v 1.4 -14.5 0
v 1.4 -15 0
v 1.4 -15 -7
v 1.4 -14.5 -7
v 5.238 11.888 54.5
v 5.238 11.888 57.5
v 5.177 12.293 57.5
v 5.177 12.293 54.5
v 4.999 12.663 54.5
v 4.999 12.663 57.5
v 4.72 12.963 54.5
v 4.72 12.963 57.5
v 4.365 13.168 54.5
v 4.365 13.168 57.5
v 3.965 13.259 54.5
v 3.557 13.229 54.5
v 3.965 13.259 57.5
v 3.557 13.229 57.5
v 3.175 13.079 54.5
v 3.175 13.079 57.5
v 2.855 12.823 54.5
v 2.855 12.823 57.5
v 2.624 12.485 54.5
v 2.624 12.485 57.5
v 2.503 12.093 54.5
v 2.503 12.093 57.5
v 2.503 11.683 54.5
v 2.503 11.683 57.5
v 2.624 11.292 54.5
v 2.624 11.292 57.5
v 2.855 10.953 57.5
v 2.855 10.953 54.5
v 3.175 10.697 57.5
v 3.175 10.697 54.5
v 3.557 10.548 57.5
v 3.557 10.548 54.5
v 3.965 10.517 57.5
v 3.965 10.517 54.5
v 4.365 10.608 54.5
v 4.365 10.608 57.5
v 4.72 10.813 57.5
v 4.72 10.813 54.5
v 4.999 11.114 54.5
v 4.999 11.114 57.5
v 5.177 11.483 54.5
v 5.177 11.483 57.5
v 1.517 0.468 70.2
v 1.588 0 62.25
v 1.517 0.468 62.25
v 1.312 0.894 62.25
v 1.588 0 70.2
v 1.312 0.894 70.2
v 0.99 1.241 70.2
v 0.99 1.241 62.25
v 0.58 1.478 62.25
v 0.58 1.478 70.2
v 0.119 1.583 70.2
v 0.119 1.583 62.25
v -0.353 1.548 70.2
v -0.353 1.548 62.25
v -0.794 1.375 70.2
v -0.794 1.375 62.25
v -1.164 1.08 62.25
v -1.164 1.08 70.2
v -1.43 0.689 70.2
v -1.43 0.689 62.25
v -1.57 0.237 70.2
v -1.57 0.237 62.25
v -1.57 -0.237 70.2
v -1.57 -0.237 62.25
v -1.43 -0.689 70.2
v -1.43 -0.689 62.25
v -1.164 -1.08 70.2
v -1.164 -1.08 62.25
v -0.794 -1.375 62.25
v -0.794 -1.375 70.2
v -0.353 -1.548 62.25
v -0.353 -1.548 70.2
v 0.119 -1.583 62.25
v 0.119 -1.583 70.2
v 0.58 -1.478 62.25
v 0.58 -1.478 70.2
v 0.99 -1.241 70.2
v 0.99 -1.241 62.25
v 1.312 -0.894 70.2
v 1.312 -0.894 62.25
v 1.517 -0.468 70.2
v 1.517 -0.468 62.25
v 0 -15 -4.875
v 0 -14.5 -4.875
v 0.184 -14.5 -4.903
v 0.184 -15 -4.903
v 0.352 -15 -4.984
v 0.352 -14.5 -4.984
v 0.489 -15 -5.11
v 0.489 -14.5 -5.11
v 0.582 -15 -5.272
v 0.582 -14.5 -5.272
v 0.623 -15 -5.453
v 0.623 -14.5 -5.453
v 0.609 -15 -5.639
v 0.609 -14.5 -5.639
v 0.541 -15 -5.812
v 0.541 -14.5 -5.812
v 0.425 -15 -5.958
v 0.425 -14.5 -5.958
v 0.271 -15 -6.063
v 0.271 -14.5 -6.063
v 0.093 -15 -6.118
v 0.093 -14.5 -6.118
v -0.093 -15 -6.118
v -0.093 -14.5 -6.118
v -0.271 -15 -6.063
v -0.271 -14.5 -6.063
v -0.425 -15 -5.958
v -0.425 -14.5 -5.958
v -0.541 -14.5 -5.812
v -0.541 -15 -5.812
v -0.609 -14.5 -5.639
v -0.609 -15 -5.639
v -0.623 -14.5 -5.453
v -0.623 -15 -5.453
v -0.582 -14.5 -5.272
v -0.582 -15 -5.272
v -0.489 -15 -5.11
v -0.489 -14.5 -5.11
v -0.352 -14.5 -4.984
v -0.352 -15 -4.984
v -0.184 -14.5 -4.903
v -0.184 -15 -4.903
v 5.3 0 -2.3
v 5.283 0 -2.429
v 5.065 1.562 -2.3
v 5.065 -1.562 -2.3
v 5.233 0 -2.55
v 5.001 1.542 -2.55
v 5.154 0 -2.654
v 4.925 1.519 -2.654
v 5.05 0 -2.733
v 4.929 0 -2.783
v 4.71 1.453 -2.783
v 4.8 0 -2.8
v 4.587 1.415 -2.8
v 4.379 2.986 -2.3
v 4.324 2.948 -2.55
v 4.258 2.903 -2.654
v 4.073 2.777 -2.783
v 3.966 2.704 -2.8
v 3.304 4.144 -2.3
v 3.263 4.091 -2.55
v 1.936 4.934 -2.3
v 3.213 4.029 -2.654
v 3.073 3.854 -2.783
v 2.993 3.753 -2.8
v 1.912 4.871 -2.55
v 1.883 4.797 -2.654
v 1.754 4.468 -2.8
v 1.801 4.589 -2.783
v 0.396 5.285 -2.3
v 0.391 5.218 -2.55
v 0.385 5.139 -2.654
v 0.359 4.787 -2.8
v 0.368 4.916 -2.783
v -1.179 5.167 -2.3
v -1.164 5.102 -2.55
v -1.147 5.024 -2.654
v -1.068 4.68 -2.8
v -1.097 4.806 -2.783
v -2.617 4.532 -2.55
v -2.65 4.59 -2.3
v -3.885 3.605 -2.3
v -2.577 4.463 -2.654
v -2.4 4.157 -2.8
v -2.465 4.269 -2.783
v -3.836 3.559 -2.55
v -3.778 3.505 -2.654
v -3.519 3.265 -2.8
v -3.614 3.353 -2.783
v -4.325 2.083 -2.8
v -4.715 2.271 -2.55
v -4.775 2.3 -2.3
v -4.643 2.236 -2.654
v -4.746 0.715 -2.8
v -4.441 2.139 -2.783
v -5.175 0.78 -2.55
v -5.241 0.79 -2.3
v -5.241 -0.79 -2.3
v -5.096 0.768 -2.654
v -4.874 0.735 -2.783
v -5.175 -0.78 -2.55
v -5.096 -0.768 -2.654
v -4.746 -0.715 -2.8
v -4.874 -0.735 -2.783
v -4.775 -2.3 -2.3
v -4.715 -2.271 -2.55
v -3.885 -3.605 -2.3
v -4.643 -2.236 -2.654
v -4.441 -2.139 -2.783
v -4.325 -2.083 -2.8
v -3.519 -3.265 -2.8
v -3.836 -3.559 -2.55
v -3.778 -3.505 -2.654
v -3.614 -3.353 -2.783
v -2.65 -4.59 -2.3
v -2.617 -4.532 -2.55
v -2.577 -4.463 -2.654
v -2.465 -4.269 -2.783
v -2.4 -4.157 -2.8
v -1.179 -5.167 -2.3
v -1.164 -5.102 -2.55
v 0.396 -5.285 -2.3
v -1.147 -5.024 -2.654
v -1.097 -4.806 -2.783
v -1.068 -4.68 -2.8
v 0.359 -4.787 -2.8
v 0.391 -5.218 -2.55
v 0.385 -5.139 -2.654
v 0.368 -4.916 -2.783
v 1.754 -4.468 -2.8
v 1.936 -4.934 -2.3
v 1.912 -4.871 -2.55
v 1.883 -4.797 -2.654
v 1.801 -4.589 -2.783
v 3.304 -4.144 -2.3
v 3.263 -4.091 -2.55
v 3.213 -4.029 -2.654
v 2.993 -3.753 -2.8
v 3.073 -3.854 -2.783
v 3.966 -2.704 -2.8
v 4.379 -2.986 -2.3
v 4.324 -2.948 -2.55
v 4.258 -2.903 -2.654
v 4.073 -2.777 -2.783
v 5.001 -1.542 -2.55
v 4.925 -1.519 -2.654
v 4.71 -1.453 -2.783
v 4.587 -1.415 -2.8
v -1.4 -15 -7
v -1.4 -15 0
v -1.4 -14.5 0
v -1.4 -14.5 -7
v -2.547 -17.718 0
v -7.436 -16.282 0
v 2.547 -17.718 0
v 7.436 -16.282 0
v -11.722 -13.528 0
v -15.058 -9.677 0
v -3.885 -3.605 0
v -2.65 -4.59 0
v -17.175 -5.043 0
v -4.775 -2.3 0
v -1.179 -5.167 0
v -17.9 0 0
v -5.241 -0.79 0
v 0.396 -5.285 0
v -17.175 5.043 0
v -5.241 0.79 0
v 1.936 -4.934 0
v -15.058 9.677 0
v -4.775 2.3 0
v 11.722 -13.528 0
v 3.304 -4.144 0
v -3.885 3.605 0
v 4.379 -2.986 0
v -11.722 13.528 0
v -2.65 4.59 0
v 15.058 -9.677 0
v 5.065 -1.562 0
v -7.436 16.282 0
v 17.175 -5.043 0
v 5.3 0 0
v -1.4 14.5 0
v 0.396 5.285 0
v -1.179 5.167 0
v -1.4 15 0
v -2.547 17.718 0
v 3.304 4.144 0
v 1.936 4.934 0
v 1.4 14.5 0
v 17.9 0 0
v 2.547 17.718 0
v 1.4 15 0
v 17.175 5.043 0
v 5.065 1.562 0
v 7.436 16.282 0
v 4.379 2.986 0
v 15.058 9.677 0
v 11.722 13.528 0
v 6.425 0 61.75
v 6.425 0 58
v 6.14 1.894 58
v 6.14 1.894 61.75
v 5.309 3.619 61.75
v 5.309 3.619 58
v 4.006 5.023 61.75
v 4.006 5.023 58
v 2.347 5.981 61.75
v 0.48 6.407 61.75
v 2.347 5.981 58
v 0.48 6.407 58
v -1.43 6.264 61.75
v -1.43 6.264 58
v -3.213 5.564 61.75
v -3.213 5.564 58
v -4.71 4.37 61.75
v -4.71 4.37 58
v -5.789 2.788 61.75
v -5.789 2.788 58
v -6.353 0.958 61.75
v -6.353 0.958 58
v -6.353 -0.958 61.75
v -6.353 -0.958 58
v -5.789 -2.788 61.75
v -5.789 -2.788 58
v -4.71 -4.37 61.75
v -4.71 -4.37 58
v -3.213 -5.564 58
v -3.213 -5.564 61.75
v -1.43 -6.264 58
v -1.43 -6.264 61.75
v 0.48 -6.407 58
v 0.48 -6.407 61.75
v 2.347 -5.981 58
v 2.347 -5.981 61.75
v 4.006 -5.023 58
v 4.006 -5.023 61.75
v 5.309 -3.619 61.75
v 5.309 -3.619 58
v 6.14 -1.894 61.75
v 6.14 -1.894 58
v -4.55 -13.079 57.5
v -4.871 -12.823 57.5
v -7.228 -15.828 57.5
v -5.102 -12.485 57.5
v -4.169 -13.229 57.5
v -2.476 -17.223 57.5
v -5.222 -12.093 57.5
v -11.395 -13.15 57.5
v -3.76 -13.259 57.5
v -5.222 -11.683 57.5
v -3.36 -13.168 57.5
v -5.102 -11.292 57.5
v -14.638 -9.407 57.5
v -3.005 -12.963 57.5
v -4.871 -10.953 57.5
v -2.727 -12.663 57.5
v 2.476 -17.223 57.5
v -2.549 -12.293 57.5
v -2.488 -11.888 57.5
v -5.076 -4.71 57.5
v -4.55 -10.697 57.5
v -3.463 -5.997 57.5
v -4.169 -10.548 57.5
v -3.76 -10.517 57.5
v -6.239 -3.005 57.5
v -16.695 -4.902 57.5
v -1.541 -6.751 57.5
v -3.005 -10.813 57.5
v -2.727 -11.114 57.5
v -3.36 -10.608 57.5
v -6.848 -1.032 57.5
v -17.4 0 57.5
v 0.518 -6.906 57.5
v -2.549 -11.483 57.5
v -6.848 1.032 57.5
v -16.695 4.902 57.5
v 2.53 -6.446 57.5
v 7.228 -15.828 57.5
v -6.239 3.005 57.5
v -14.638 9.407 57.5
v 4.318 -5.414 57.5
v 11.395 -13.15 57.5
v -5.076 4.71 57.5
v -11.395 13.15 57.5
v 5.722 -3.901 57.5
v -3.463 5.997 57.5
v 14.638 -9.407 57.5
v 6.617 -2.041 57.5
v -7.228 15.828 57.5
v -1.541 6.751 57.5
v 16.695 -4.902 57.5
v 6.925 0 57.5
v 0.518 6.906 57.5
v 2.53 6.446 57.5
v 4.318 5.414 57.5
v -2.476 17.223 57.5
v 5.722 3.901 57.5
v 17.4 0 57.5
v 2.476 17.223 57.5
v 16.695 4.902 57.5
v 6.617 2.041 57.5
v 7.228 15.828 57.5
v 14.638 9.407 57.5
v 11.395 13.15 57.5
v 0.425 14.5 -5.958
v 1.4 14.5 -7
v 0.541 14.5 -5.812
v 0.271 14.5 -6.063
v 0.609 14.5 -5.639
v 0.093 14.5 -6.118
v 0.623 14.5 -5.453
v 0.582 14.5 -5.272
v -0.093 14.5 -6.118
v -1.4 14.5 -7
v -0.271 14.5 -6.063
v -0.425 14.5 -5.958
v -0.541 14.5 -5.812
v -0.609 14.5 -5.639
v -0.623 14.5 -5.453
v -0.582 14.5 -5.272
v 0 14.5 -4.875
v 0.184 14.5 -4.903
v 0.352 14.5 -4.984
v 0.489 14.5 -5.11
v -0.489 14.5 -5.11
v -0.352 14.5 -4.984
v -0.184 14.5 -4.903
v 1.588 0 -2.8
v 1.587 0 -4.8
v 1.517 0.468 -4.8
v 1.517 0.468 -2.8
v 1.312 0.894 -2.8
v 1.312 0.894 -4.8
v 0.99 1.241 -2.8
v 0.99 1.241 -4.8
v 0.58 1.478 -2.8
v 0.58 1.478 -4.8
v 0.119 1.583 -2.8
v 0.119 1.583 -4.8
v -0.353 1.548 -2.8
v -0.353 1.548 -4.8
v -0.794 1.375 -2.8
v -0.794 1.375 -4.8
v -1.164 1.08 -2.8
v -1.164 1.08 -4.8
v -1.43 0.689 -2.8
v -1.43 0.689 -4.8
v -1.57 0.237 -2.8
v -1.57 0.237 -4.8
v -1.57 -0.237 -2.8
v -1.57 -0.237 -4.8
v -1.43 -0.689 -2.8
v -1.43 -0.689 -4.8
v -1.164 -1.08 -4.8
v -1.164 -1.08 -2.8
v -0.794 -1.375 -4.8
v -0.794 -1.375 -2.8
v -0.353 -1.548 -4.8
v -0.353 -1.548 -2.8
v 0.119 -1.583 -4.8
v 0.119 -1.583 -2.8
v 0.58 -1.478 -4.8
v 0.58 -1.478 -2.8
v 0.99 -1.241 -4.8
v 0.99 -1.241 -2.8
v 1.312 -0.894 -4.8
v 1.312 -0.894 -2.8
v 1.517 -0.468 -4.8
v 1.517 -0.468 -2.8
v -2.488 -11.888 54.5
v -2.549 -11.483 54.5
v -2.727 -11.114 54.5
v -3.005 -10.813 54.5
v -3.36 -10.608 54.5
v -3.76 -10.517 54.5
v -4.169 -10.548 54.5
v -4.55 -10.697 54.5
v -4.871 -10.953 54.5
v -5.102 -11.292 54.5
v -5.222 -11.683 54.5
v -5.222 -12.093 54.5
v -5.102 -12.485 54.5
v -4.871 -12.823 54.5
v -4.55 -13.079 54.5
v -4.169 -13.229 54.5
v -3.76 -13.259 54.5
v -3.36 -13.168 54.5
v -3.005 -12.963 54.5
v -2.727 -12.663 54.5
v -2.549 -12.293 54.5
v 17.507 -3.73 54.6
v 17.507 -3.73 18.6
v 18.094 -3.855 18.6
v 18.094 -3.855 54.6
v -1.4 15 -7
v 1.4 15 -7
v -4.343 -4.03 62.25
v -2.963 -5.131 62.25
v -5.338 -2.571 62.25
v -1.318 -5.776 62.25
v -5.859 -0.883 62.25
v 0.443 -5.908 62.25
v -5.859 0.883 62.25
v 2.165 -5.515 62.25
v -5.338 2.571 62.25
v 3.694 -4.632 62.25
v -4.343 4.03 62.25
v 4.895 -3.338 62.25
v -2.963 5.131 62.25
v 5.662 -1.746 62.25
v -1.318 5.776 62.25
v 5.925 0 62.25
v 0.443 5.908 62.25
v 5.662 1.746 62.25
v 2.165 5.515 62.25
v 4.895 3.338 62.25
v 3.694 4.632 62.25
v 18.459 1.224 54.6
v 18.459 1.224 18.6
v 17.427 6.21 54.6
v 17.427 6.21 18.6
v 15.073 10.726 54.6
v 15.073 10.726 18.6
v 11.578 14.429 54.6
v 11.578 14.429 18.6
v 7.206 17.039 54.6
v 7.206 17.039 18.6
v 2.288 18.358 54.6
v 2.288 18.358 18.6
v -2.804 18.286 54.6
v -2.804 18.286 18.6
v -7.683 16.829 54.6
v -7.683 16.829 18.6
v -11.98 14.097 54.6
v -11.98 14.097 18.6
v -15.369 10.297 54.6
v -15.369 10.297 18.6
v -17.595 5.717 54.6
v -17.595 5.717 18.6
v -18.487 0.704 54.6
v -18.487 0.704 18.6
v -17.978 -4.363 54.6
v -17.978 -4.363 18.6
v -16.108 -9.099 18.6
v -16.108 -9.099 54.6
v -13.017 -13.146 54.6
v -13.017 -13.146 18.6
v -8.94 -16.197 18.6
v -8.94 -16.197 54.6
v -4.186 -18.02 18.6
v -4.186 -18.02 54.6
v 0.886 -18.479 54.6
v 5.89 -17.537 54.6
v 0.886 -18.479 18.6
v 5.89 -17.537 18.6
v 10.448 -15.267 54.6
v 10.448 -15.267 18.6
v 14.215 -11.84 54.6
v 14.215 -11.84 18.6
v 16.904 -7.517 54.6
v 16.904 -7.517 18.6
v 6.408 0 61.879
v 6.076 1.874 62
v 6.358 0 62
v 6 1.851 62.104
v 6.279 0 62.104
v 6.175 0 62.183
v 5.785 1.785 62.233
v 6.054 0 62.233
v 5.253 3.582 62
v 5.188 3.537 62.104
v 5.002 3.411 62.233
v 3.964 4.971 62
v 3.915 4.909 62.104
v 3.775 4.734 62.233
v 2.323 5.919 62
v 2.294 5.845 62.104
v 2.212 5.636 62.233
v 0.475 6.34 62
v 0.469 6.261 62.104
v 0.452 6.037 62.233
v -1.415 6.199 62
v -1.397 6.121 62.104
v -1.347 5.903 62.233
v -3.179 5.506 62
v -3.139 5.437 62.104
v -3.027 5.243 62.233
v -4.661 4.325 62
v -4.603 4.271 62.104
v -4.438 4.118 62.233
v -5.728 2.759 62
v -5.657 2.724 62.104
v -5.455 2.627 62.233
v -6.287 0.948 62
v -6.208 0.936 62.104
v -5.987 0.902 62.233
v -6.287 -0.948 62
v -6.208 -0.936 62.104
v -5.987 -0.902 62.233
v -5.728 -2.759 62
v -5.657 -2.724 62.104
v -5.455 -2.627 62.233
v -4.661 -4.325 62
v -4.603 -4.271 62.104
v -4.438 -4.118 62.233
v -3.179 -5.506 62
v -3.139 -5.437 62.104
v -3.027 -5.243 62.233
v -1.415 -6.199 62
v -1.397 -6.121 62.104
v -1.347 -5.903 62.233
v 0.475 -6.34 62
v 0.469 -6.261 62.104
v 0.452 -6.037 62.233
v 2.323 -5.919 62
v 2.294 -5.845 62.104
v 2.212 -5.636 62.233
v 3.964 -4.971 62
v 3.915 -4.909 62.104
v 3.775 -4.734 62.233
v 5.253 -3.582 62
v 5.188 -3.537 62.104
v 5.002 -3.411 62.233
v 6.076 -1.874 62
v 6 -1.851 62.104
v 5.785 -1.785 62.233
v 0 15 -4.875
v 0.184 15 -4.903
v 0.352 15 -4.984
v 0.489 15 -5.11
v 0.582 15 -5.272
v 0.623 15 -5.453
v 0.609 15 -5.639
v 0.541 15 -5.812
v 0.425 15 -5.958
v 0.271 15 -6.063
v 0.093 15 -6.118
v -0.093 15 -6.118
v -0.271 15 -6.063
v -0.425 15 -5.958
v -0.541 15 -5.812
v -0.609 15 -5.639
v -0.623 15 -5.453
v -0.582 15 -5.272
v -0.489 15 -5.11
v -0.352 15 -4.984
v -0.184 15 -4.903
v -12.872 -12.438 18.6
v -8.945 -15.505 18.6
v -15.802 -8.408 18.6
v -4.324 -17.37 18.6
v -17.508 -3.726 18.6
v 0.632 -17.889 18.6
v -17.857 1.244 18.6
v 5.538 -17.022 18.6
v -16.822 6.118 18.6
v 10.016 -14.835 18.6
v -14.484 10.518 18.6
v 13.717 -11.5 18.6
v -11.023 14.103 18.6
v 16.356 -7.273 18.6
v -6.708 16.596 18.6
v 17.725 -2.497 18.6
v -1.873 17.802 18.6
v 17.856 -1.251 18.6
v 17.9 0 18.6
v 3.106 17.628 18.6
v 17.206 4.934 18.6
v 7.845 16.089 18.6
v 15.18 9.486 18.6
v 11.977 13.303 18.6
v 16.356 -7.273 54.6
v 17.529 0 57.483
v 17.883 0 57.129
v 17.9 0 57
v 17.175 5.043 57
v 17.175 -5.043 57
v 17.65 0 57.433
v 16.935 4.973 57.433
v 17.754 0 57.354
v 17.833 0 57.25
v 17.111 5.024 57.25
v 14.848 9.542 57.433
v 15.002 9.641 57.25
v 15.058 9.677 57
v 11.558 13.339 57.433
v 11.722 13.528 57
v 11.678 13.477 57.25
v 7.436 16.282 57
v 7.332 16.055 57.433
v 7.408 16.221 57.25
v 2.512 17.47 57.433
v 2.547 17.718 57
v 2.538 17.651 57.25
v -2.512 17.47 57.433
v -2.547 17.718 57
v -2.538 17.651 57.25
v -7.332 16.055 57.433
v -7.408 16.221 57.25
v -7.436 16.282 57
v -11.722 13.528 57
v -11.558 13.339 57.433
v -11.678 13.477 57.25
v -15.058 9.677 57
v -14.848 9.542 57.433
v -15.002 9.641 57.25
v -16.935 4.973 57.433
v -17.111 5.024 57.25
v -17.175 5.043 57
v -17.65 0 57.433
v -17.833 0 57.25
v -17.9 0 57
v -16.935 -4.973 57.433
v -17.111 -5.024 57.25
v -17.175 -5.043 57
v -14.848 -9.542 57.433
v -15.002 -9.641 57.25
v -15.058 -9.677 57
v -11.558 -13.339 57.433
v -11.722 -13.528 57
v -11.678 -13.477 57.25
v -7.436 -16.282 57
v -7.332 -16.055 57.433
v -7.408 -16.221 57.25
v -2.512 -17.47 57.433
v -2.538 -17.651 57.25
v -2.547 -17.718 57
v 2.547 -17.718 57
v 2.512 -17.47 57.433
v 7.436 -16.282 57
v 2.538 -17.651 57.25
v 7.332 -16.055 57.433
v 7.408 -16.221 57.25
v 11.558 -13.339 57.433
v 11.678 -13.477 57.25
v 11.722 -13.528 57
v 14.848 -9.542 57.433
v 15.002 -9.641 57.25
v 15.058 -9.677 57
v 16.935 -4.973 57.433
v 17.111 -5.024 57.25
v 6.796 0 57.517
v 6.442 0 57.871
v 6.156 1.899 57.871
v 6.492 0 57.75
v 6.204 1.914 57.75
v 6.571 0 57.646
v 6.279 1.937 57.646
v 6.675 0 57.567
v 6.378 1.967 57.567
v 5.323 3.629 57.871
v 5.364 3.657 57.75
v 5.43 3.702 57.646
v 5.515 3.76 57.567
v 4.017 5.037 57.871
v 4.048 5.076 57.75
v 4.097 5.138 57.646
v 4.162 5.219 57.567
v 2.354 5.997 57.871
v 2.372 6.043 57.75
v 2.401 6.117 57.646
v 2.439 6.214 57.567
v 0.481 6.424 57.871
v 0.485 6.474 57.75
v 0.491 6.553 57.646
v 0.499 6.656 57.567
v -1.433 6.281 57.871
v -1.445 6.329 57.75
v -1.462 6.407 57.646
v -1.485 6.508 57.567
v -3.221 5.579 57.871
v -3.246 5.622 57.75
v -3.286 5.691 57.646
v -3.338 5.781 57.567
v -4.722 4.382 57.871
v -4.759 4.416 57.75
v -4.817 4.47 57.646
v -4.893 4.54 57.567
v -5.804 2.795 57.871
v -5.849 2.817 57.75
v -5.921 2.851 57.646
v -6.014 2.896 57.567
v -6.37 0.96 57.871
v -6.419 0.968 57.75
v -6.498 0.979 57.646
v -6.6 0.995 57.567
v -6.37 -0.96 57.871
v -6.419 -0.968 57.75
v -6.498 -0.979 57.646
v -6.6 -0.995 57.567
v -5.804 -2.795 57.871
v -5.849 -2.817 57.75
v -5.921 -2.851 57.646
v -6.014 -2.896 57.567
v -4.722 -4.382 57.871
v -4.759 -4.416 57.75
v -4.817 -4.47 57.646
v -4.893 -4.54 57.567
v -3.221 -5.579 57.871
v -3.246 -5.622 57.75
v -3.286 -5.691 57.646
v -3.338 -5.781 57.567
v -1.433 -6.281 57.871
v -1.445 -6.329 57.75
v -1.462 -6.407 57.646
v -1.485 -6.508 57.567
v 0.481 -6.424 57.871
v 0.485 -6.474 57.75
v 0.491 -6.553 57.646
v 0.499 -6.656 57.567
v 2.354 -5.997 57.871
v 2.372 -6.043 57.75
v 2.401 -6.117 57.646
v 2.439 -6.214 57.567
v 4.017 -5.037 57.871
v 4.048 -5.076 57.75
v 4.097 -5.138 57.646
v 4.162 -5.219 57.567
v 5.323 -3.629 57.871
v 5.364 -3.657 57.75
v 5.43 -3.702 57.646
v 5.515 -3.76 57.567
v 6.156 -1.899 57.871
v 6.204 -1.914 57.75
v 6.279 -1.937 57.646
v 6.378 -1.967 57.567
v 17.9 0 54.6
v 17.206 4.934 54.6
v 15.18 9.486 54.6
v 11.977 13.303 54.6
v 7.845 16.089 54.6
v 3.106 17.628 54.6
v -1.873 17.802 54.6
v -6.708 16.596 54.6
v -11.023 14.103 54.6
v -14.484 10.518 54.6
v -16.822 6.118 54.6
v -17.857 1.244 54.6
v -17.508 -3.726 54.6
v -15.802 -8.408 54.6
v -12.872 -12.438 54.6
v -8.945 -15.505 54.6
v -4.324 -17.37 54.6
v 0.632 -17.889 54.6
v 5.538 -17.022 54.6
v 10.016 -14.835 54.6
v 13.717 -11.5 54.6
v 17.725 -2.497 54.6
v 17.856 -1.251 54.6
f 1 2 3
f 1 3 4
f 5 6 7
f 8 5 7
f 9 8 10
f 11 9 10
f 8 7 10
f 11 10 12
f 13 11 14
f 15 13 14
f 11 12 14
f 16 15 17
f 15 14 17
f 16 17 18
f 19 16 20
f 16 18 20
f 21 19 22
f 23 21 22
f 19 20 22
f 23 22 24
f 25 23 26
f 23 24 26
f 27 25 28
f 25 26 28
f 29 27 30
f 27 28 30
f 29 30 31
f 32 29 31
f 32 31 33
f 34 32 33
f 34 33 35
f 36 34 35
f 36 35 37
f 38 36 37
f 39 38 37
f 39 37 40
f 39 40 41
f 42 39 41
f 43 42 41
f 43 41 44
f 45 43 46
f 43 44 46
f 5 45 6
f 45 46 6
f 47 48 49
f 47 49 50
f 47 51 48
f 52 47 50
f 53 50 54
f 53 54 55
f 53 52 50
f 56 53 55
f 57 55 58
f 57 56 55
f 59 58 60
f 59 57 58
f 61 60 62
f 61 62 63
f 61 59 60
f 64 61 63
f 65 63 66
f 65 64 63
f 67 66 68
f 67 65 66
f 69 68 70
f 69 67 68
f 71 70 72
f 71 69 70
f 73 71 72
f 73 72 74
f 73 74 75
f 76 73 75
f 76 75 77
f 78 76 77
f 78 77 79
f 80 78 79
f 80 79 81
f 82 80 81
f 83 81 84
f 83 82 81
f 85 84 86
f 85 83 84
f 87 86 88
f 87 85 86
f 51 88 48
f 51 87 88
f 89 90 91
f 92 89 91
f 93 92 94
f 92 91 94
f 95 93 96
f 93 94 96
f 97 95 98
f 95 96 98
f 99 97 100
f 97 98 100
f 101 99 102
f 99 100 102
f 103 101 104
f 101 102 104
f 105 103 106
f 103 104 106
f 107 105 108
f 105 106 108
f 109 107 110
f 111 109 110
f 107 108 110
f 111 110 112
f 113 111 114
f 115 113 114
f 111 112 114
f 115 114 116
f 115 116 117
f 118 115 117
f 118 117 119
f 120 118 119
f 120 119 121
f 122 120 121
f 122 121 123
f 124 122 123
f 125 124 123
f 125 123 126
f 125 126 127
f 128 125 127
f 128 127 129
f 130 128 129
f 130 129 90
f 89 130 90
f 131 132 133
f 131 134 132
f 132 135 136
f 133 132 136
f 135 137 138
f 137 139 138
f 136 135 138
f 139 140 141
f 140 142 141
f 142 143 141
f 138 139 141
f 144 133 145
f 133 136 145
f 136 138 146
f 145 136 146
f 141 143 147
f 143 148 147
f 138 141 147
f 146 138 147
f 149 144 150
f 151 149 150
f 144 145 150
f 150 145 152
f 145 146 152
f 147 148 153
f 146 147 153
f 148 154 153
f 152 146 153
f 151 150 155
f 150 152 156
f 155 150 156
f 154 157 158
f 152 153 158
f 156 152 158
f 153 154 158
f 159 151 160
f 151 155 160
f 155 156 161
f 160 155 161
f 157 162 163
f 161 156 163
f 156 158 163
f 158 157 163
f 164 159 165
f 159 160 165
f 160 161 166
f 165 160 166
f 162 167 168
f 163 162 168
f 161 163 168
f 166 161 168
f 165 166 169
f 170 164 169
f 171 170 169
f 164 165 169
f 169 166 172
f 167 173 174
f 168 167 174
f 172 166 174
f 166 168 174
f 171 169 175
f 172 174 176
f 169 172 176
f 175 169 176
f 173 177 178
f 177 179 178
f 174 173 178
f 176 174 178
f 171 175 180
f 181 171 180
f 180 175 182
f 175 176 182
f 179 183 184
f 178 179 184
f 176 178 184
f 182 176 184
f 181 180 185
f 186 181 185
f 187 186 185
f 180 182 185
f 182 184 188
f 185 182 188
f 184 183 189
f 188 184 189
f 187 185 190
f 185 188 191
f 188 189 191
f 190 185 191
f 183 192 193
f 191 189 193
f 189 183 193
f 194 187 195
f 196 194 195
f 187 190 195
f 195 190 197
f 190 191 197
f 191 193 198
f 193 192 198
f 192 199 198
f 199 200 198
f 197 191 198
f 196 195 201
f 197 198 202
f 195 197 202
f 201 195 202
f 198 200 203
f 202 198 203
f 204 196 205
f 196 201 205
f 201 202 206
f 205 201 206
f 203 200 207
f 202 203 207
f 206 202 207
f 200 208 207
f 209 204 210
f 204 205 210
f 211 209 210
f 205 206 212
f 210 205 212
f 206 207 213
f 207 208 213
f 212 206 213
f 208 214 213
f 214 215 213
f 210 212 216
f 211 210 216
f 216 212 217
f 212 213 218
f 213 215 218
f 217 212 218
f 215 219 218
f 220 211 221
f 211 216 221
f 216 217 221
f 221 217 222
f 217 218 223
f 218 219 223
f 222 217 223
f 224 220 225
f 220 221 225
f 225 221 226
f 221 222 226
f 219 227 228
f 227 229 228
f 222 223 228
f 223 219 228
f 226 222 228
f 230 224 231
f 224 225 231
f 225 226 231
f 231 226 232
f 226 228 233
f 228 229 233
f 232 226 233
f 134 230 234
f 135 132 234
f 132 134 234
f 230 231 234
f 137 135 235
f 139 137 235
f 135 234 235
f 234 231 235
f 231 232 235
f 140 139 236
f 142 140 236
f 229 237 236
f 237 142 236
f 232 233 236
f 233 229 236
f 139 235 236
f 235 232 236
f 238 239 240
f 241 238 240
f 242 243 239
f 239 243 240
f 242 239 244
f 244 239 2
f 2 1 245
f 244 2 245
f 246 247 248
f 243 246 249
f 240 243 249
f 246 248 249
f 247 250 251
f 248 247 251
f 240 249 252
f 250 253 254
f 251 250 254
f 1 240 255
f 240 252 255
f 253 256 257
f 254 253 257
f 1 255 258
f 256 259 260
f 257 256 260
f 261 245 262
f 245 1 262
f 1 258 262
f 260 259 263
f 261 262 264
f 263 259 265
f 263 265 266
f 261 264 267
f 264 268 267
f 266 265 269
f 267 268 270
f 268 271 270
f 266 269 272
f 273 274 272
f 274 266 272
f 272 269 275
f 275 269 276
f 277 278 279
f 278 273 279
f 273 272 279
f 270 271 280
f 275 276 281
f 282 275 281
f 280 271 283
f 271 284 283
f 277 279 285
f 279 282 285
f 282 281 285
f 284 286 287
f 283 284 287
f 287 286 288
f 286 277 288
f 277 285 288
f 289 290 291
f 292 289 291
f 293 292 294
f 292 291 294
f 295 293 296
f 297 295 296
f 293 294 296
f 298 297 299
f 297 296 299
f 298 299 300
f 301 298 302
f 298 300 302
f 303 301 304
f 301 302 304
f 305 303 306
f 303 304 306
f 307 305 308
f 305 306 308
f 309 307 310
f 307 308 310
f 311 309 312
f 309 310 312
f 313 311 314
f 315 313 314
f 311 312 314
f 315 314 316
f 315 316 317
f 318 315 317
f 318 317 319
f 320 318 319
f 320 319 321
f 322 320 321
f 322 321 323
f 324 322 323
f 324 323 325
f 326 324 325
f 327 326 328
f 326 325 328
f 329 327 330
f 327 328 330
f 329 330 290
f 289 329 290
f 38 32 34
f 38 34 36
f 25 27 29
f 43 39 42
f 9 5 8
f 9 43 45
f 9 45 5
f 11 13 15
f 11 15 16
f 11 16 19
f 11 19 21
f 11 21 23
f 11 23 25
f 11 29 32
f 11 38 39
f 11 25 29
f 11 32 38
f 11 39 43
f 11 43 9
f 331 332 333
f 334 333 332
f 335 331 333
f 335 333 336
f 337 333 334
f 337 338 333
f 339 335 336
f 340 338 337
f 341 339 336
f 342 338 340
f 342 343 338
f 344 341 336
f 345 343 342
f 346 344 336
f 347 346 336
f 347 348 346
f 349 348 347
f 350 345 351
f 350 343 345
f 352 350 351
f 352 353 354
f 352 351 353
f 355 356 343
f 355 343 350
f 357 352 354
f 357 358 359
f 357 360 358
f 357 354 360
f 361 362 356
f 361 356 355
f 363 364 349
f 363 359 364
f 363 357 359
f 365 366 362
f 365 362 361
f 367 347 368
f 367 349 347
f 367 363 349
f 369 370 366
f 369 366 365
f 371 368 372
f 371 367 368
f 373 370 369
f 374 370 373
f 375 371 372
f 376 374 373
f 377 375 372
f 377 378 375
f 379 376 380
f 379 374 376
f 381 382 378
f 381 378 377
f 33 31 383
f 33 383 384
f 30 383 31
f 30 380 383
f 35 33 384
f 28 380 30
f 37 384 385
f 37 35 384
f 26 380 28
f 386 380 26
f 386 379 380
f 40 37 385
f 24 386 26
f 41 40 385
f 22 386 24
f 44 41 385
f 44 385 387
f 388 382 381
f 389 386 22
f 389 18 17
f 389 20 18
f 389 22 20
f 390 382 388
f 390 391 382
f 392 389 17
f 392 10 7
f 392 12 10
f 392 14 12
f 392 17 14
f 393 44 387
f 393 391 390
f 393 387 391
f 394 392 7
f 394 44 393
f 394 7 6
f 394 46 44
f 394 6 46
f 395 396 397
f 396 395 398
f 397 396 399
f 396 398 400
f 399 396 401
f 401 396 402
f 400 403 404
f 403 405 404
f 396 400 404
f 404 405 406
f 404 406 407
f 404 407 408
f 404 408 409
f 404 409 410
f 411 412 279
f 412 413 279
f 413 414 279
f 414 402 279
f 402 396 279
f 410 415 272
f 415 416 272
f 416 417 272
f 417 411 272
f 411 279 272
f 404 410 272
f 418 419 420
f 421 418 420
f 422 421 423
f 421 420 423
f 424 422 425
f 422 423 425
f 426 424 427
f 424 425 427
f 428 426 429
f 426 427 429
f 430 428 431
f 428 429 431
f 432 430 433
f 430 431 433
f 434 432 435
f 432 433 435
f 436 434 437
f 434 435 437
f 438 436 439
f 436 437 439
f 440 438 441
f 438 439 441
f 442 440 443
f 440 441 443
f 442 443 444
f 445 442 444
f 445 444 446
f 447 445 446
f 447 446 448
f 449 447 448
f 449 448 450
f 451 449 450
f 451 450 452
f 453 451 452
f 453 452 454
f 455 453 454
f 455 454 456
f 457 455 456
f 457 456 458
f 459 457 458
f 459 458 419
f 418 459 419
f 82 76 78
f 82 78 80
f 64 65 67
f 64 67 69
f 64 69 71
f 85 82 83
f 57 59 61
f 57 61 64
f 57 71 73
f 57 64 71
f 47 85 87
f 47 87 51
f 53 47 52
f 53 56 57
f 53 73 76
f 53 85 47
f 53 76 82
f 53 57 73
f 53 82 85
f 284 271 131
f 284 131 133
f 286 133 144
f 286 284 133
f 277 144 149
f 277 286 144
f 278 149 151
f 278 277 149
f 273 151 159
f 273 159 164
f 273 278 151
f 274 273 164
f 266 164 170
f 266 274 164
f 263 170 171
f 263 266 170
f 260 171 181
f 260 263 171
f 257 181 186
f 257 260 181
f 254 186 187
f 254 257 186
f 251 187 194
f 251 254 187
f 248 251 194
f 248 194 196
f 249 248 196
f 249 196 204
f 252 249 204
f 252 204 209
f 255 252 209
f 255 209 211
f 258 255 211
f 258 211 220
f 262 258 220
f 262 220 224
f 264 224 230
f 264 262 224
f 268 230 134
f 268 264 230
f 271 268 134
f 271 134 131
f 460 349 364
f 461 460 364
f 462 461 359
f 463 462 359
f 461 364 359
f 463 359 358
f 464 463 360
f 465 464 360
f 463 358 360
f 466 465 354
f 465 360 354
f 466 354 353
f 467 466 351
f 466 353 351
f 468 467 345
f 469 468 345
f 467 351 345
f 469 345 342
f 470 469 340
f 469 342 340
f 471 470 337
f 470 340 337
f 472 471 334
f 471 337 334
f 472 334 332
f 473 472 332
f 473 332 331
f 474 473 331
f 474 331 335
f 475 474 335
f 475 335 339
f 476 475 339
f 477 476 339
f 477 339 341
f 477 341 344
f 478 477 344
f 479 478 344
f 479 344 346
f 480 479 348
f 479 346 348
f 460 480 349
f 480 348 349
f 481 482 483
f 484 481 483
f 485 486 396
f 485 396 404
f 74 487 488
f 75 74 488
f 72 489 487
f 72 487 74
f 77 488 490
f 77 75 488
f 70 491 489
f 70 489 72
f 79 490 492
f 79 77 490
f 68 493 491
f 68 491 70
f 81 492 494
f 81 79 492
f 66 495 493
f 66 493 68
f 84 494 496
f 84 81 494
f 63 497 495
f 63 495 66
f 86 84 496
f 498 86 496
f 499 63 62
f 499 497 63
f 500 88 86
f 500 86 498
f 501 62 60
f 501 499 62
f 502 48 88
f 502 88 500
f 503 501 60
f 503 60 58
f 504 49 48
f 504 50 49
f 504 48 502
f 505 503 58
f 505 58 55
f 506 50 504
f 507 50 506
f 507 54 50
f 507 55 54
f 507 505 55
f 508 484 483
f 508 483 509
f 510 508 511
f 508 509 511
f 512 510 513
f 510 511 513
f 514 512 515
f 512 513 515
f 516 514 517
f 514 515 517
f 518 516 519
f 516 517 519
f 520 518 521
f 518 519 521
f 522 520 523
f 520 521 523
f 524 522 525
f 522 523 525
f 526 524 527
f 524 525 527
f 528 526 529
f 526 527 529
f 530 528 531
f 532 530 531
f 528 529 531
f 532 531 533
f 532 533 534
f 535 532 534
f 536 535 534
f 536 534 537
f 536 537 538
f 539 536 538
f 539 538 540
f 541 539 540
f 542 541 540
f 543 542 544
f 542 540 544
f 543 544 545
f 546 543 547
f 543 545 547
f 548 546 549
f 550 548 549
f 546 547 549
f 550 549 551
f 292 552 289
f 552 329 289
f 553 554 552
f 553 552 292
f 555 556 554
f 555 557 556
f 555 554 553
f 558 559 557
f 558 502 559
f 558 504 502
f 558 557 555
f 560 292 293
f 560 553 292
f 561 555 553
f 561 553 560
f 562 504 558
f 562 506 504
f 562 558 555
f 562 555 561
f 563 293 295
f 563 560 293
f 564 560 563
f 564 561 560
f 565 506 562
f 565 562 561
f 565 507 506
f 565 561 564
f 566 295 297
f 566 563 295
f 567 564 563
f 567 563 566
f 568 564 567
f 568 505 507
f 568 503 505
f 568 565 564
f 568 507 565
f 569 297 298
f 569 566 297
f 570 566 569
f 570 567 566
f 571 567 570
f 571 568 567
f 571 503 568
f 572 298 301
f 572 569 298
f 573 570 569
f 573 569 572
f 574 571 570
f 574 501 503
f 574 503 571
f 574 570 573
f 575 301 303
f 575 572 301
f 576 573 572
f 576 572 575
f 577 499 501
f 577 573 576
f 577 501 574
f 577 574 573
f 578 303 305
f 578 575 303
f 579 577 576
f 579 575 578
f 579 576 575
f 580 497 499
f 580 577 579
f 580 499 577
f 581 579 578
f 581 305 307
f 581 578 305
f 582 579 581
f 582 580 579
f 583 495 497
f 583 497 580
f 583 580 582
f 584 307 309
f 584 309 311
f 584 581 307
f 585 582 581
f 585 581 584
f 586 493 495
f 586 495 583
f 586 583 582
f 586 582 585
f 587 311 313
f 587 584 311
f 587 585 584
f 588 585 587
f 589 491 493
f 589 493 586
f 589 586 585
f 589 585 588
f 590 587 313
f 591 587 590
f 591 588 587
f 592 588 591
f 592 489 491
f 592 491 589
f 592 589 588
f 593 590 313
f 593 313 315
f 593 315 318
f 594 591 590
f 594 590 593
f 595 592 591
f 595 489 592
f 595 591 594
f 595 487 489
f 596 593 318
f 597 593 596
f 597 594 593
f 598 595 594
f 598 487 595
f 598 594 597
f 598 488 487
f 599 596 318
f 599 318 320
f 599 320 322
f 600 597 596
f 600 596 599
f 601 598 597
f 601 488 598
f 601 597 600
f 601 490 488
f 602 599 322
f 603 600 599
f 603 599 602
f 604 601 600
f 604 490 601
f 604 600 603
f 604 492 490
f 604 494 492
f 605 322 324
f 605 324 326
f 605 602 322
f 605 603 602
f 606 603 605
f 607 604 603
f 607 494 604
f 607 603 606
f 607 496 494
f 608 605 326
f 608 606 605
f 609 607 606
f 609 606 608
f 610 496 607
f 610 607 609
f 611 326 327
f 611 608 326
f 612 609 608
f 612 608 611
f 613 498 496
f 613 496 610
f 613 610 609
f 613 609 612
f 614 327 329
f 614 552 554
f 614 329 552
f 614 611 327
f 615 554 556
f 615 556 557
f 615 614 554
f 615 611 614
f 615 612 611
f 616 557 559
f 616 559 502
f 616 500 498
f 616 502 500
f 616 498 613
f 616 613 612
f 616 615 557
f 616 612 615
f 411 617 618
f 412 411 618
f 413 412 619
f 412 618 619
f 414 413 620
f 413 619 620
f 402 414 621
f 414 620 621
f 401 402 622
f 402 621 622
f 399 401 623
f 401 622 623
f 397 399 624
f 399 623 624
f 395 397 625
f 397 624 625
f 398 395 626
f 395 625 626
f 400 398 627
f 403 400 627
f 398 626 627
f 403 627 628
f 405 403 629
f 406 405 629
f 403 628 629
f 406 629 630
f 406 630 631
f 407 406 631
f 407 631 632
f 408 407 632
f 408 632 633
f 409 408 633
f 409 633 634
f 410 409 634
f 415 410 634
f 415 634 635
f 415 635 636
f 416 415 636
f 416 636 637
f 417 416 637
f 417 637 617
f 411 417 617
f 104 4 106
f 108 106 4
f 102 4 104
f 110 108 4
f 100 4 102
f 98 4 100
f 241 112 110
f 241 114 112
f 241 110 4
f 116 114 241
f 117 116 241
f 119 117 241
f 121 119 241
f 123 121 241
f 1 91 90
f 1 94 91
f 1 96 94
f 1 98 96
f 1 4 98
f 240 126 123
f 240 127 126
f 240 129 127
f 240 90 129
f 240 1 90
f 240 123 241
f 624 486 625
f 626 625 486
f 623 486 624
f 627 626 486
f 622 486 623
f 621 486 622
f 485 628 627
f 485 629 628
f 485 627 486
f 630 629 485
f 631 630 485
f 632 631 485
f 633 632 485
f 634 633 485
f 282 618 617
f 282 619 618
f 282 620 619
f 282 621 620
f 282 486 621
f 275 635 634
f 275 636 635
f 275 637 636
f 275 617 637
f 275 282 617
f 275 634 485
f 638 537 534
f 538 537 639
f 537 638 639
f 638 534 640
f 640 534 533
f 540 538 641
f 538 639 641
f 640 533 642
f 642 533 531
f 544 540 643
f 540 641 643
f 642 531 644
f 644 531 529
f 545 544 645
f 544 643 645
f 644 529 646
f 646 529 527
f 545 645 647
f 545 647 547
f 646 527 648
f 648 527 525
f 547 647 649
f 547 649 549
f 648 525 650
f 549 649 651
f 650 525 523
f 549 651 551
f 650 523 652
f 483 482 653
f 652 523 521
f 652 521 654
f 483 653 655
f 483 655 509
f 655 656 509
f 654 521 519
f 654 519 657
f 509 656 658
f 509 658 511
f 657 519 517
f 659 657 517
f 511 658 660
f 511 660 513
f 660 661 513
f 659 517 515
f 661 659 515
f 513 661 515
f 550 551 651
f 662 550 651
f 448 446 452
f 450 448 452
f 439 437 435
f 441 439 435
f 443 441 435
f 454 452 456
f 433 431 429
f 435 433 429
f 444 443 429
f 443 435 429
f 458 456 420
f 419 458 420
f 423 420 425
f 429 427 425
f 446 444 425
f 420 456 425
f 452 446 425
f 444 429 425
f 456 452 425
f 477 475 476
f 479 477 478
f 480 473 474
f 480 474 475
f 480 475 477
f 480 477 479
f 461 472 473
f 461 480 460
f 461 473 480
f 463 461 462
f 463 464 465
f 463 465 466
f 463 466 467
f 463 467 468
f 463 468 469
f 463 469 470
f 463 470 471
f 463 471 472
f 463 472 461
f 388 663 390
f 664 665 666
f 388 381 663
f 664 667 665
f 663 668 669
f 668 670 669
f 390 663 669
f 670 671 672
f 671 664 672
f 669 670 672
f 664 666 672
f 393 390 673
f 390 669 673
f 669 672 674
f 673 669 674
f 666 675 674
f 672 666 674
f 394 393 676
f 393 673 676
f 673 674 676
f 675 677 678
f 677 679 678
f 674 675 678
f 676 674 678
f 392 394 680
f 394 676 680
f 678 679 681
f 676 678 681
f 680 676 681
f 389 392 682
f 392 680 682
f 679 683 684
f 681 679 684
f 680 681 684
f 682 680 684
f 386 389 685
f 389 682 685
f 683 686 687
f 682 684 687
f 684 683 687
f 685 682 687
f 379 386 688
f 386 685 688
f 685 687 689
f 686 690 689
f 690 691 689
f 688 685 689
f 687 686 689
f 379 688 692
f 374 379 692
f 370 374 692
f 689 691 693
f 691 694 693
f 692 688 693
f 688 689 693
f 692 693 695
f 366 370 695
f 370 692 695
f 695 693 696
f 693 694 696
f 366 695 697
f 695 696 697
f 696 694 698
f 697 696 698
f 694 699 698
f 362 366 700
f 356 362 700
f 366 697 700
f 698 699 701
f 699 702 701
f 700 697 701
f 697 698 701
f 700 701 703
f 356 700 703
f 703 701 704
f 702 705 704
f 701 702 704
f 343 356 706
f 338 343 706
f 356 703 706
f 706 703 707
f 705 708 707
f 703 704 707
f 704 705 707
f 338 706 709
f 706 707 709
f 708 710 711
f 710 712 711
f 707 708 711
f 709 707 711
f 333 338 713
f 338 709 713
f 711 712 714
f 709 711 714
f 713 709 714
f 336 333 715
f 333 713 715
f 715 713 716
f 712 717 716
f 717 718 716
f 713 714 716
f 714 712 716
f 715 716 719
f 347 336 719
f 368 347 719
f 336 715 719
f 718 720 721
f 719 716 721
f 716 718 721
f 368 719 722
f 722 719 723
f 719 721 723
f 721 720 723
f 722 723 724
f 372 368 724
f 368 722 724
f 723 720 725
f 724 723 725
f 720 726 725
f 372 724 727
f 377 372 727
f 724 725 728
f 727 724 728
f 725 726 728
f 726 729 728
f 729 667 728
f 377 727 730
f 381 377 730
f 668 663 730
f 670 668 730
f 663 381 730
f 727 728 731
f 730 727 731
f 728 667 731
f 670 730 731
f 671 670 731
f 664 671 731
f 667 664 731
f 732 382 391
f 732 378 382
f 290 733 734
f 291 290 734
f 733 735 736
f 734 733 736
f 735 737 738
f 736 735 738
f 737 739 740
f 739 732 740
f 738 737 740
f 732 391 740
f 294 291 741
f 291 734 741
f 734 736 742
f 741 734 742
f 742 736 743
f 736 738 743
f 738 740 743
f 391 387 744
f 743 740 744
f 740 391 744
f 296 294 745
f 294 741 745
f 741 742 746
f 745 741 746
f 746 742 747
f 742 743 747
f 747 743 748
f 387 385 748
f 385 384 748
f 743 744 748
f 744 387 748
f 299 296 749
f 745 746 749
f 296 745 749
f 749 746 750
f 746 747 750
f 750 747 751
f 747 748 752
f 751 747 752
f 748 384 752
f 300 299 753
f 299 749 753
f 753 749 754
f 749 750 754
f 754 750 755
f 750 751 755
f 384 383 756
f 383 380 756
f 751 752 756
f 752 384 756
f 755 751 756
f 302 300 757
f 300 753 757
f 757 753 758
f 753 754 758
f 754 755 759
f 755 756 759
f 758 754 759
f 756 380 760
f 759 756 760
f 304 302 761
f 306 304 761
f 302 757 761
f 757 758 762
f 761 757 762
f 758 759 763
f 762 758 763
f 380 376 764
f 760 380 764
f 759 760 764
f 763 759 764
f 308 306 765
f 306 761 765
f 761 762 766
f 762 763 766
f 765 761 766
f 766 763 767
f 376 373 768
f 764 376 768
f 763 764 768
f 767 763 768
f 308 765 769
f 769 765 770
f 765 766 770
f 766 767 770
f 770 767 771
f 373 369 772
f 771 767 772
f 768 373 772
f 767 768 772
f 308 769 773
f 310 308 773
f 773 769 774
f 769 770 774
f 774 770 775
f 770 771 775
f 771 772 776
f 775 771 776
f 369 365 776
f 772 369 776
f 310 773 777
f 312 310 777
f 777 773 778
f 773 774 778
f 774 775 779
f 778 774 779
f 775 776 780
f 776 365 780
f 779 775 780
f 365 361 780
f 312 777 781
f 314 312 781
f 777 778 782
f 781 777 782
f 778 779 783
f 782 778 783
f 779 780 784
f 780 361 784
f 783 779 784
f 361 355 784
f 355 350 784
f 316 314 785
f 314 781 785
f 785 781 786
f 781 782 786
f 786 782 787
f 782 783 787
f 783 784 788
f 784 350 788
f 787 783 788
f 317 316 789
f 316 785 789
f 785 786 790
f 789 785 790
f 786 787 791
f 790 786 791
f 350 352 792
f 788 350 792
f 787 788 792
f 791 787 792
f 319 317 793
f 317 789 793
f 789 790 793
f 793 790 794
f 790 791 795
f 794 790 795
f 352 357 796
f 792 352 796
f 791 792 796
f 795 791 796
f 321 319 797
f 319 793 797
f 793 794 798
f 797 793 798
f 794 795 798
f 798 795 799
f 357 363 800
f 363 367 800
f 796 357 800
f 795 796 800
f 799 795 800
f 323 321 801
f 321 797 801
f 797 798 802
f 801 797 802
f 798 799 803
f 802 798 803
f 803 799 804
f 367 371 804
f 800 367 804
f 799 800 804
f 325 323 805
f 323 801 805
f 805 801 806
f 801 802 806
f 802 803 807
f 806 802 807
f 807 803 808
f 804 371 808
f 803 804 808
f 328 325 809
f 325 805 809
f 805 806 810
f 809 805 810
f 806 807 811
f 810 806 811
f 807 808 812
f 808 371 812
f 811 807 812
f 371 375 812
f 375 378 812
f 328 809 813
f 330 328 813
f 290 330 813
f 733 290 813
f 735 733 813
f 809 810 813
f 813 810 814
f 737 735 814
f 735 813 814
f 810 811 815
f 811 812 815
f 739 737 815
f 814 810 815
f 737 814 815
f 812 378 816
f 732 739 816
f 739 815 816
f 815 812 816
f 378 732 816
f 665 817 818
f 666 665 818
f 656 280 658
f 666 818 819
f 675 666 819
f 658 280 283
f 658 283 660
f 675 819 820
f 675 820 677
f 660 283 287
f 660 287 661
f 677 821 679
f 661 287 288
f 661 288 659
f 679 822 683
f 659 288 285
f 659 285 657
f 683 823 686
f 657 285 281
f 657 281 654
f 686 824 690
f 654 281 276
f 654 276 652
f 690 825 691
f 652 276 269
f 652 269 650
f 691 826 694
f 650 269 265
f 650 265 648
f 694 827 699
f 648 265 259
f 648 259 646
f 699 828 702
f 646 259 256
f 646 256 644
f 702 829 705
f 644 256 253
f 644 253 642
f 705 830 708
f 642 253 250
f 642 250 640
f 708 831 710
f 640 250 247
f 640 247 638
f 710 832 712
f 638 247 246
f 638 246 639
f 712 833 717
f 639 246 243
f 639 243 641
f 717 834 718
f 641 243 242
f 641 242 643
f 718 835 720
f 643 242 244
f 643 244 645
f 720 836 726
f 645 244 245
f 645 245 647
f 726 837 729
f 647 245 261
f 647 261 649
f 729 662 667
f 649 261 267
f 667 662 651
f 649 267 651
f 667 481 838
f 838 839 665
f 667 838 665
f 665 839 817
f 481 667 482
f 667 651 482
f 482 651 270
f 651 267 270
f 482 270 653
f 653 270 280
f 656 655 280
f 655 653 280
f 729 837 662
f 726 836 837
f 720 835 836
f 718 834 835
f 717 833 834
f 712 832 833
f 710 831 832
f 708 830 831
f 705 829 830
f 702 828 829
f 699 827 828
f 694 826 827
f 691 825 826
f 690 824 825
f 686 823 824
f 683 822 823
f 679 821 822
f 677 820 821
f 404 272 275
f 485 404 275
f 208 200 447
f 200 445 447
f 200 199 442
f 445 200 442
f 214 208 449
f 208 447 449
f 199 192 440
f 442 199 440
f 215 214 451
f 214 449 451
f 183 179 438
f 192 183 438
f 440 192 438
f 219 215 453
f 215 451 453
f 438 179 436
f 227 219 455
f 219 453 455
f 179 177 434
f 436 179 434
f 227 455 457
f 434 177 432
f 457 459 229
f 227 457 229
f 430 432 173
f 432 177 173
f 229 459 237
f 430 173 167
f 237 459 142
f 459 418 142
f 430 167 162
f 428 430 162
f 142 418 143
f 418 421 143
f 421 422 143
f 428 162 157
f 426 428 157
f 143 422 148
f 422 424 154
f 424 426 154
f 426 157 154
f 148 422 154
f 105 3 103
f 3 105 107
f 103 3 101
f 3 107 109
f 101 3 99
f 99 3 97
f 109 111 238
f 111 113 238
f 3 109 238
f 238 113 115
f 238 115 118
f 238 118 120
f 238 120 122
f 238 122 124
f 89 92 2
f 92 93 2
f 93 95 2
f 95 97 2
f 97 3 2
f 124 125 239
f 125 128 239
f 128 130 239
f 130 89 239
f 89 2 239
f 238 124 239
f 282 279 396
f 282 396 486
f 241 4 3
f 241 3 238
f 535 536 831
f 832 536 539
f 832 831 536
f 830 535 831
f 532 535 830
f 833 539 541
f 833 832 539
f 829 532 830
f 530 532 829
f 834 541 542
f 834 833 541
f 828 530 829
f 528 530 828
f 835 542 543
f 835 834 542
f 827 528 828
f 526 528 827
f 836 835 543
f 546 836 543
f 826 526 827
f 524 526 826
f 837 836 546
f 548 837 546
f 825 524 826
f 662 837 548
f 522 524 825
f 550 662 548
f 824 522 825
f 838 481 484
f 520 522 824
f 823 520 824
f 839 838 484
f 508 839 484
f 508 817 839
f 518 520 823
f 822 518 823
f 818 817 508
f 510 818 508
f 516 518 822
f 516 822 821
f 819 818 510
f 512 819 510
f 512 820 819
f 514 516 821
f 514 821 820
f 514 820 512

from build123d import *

# Parameters (mm, degrees)
SKETCH1_R                = 17.9
BOSS_EXTRUDE1_DEPTH      = 57.5
SKETCH1_3_R              = 5.3
SKETCH1_3_R_2            = 1.5875
BOSS_EXTRUDE2_DEPTH      = 2.8
BOSS_EXTRUDE4_DEPTH      = 57.5
BOSS_EXTRUDE4_DEPTH_BACK = 2
BOSS_EXTRUDE4_START      = -2.8
SKETCH1_5_R              = 1.5875
BOSS_EXTRUDE5_START      = 70.2
SKETCH1_6_R              = 1.5875
BOSS_EXTRUDE5_DEPTH      = 75
SKETCH2_R                = 1.375
CUT_EXTRUDE1_DEPTH       = 3
SKETCH3_W                = 2.8
SKETCH3_H                = 0.5
BOSS_EXTRUDE6_DEPTH      = 7
SKETCH4_R                = 0.625
CUT_EXTRUDE2_DEPTH       = 80.566701578
SKETCH2_3_R              = 6.425
BOSS_EXTRUDE7_DEPTH      = 4.75
BOSS_EXTRUDE8_START      = -38.9
BOSS_EXTRUDE8_DEPTH      = 36
FILLET1_R                = 0.5


with BuildPart() as part:
    # Sketch1 → Boss-Extrude1 (new body)
    with BuildSketch(Plane.XY):
        Circle(SKETCH1_R)
    extrude(amount=BOSS_EXTRUDE1_DEPTH)

    # Sketch1<3> → Boss-Extrude2 (add)
    with BuildSketch(Plane.XY):
        Circle(SKETCH1_3_R)
        Circle(SKETCH1_3_R_2, mode=Mode.SUBTRACT)
    extrude(amount=-BOSS_EXTRUDE2_DEPTH)

    # Sketch1<5> → Boss-Extrude4 (add, two sides: drawn at the far end of the back side and taken through both)
    with BuildSketch(Plane.XY.offset(BOSS_EXTRUDE4_START - BOSS_EXTRUDE4_DEPTH_BACK)):
        Circle(SKETCH1_5_R)
    extrude(amount=BOSS_EXTRUDE4_DEPTH + BOSS_EXTRUDE4_DEPTH_BACK)

    # Sketch1<6> → Boss-Extrude5 (add)
    with BuildSketch(Plane.XY.offset(BOSS_EXTRUDE5_START)):
        Circle(SKETCH1_6_R)
    extrude(amount=-BOSS_EXTRUDE5_DEPTH)

    # Sketch2 → Cut-Extrude1 (cut)
    with BuildSketch(Plane.XY.offset(57.5)):
        with Locations((3.86271243, 11.888206454)):
            Circle(SKETCH2_R)
        with Locations((-3.86271243, -11.888206454)):
            Circle(SKETCH2_R)
    extrude(amount=-CUT_EXTRUDE1_DEPTH, mode=Mode.SUBTRACT)

    # Sketch3 → Boss-Extrude6 (add)
    with BuildSketch(Plane(origin=(0, 0, 0), x_dir=(-1, 0, 0), z_dir=(0, 0, -1))):
        with Locations((0, -14.75)):
            Rectangle(SKETCH3_W, SKETCH3_H)
        with Locations((0, 14.75)):
            Rectangle(SKETCH3_W, SKETCH3_H)
    extrude(amount=BOSS_EXTRUDE6_DEPTH)

    # Sketch4 → Cut-Extrude2 (cut, through all)
    with BuildSketch(Plane(origin=(0, 15, 0), x_dir=(1, 0, 0), z_dir=(0, 1, 0))):
        with Locations(Location((0, 5.5, 0), (0, 0, 270))):
            Circle(SKETCH4_R)
    extrude(amount=-CUT_EXTRUDE2_DEPTH, mode=Mode.SUBTRACT)

    # Sketch2<3> → Boss-Extrude7 (add)
    with BuildSketch(Plane.XY.offset(57.5)):
        Circle(SKETCH2_3_R)
    extrude(amount=BOSS_EXTRUDE7_DEPTH)

    # Sketch5 → Boss-Extrude8 (add)
    with BuildSketch(Plane.XY.offset(57.5).offset(BOSS_EXTRUDE8_START)):
        with BuildLine():
            Line((17.50706481, -3.729970743), (18.093893798, -3.854997695))
            ThreePointArc((18.093893798, -3.854997695), (-17.594545551, 5.716814396), (16.90417837, -7.516565283))
            Line((16.90417837, -7.516565283), (16.355934747, -7.272784787))
            ThreePointArc((16.355934747, -7.272784787), (-17.509729181, 3.717443209), (17.9, 0))
            ThreePointArc((17.9, 0), (17.801495163, -1.875305295), (17.50706481, -3.729970743))
        make_face()
    extrude(amount=BOSS_EXTRUDE8_DEPTH)

    # Fillet1
    fillet1_edges = [part.edges().sort_by_distance(p)[0] for p in [
        (-17.9, 0, 57.5),
        (-5.3, 0, -2.8),
        (-6.425, 0, 57.5),
        (-6.425, 0, 62.25),
    ]]
    fillet(fillet1_edges, radius=FILLET1_R)


solid = part.part
